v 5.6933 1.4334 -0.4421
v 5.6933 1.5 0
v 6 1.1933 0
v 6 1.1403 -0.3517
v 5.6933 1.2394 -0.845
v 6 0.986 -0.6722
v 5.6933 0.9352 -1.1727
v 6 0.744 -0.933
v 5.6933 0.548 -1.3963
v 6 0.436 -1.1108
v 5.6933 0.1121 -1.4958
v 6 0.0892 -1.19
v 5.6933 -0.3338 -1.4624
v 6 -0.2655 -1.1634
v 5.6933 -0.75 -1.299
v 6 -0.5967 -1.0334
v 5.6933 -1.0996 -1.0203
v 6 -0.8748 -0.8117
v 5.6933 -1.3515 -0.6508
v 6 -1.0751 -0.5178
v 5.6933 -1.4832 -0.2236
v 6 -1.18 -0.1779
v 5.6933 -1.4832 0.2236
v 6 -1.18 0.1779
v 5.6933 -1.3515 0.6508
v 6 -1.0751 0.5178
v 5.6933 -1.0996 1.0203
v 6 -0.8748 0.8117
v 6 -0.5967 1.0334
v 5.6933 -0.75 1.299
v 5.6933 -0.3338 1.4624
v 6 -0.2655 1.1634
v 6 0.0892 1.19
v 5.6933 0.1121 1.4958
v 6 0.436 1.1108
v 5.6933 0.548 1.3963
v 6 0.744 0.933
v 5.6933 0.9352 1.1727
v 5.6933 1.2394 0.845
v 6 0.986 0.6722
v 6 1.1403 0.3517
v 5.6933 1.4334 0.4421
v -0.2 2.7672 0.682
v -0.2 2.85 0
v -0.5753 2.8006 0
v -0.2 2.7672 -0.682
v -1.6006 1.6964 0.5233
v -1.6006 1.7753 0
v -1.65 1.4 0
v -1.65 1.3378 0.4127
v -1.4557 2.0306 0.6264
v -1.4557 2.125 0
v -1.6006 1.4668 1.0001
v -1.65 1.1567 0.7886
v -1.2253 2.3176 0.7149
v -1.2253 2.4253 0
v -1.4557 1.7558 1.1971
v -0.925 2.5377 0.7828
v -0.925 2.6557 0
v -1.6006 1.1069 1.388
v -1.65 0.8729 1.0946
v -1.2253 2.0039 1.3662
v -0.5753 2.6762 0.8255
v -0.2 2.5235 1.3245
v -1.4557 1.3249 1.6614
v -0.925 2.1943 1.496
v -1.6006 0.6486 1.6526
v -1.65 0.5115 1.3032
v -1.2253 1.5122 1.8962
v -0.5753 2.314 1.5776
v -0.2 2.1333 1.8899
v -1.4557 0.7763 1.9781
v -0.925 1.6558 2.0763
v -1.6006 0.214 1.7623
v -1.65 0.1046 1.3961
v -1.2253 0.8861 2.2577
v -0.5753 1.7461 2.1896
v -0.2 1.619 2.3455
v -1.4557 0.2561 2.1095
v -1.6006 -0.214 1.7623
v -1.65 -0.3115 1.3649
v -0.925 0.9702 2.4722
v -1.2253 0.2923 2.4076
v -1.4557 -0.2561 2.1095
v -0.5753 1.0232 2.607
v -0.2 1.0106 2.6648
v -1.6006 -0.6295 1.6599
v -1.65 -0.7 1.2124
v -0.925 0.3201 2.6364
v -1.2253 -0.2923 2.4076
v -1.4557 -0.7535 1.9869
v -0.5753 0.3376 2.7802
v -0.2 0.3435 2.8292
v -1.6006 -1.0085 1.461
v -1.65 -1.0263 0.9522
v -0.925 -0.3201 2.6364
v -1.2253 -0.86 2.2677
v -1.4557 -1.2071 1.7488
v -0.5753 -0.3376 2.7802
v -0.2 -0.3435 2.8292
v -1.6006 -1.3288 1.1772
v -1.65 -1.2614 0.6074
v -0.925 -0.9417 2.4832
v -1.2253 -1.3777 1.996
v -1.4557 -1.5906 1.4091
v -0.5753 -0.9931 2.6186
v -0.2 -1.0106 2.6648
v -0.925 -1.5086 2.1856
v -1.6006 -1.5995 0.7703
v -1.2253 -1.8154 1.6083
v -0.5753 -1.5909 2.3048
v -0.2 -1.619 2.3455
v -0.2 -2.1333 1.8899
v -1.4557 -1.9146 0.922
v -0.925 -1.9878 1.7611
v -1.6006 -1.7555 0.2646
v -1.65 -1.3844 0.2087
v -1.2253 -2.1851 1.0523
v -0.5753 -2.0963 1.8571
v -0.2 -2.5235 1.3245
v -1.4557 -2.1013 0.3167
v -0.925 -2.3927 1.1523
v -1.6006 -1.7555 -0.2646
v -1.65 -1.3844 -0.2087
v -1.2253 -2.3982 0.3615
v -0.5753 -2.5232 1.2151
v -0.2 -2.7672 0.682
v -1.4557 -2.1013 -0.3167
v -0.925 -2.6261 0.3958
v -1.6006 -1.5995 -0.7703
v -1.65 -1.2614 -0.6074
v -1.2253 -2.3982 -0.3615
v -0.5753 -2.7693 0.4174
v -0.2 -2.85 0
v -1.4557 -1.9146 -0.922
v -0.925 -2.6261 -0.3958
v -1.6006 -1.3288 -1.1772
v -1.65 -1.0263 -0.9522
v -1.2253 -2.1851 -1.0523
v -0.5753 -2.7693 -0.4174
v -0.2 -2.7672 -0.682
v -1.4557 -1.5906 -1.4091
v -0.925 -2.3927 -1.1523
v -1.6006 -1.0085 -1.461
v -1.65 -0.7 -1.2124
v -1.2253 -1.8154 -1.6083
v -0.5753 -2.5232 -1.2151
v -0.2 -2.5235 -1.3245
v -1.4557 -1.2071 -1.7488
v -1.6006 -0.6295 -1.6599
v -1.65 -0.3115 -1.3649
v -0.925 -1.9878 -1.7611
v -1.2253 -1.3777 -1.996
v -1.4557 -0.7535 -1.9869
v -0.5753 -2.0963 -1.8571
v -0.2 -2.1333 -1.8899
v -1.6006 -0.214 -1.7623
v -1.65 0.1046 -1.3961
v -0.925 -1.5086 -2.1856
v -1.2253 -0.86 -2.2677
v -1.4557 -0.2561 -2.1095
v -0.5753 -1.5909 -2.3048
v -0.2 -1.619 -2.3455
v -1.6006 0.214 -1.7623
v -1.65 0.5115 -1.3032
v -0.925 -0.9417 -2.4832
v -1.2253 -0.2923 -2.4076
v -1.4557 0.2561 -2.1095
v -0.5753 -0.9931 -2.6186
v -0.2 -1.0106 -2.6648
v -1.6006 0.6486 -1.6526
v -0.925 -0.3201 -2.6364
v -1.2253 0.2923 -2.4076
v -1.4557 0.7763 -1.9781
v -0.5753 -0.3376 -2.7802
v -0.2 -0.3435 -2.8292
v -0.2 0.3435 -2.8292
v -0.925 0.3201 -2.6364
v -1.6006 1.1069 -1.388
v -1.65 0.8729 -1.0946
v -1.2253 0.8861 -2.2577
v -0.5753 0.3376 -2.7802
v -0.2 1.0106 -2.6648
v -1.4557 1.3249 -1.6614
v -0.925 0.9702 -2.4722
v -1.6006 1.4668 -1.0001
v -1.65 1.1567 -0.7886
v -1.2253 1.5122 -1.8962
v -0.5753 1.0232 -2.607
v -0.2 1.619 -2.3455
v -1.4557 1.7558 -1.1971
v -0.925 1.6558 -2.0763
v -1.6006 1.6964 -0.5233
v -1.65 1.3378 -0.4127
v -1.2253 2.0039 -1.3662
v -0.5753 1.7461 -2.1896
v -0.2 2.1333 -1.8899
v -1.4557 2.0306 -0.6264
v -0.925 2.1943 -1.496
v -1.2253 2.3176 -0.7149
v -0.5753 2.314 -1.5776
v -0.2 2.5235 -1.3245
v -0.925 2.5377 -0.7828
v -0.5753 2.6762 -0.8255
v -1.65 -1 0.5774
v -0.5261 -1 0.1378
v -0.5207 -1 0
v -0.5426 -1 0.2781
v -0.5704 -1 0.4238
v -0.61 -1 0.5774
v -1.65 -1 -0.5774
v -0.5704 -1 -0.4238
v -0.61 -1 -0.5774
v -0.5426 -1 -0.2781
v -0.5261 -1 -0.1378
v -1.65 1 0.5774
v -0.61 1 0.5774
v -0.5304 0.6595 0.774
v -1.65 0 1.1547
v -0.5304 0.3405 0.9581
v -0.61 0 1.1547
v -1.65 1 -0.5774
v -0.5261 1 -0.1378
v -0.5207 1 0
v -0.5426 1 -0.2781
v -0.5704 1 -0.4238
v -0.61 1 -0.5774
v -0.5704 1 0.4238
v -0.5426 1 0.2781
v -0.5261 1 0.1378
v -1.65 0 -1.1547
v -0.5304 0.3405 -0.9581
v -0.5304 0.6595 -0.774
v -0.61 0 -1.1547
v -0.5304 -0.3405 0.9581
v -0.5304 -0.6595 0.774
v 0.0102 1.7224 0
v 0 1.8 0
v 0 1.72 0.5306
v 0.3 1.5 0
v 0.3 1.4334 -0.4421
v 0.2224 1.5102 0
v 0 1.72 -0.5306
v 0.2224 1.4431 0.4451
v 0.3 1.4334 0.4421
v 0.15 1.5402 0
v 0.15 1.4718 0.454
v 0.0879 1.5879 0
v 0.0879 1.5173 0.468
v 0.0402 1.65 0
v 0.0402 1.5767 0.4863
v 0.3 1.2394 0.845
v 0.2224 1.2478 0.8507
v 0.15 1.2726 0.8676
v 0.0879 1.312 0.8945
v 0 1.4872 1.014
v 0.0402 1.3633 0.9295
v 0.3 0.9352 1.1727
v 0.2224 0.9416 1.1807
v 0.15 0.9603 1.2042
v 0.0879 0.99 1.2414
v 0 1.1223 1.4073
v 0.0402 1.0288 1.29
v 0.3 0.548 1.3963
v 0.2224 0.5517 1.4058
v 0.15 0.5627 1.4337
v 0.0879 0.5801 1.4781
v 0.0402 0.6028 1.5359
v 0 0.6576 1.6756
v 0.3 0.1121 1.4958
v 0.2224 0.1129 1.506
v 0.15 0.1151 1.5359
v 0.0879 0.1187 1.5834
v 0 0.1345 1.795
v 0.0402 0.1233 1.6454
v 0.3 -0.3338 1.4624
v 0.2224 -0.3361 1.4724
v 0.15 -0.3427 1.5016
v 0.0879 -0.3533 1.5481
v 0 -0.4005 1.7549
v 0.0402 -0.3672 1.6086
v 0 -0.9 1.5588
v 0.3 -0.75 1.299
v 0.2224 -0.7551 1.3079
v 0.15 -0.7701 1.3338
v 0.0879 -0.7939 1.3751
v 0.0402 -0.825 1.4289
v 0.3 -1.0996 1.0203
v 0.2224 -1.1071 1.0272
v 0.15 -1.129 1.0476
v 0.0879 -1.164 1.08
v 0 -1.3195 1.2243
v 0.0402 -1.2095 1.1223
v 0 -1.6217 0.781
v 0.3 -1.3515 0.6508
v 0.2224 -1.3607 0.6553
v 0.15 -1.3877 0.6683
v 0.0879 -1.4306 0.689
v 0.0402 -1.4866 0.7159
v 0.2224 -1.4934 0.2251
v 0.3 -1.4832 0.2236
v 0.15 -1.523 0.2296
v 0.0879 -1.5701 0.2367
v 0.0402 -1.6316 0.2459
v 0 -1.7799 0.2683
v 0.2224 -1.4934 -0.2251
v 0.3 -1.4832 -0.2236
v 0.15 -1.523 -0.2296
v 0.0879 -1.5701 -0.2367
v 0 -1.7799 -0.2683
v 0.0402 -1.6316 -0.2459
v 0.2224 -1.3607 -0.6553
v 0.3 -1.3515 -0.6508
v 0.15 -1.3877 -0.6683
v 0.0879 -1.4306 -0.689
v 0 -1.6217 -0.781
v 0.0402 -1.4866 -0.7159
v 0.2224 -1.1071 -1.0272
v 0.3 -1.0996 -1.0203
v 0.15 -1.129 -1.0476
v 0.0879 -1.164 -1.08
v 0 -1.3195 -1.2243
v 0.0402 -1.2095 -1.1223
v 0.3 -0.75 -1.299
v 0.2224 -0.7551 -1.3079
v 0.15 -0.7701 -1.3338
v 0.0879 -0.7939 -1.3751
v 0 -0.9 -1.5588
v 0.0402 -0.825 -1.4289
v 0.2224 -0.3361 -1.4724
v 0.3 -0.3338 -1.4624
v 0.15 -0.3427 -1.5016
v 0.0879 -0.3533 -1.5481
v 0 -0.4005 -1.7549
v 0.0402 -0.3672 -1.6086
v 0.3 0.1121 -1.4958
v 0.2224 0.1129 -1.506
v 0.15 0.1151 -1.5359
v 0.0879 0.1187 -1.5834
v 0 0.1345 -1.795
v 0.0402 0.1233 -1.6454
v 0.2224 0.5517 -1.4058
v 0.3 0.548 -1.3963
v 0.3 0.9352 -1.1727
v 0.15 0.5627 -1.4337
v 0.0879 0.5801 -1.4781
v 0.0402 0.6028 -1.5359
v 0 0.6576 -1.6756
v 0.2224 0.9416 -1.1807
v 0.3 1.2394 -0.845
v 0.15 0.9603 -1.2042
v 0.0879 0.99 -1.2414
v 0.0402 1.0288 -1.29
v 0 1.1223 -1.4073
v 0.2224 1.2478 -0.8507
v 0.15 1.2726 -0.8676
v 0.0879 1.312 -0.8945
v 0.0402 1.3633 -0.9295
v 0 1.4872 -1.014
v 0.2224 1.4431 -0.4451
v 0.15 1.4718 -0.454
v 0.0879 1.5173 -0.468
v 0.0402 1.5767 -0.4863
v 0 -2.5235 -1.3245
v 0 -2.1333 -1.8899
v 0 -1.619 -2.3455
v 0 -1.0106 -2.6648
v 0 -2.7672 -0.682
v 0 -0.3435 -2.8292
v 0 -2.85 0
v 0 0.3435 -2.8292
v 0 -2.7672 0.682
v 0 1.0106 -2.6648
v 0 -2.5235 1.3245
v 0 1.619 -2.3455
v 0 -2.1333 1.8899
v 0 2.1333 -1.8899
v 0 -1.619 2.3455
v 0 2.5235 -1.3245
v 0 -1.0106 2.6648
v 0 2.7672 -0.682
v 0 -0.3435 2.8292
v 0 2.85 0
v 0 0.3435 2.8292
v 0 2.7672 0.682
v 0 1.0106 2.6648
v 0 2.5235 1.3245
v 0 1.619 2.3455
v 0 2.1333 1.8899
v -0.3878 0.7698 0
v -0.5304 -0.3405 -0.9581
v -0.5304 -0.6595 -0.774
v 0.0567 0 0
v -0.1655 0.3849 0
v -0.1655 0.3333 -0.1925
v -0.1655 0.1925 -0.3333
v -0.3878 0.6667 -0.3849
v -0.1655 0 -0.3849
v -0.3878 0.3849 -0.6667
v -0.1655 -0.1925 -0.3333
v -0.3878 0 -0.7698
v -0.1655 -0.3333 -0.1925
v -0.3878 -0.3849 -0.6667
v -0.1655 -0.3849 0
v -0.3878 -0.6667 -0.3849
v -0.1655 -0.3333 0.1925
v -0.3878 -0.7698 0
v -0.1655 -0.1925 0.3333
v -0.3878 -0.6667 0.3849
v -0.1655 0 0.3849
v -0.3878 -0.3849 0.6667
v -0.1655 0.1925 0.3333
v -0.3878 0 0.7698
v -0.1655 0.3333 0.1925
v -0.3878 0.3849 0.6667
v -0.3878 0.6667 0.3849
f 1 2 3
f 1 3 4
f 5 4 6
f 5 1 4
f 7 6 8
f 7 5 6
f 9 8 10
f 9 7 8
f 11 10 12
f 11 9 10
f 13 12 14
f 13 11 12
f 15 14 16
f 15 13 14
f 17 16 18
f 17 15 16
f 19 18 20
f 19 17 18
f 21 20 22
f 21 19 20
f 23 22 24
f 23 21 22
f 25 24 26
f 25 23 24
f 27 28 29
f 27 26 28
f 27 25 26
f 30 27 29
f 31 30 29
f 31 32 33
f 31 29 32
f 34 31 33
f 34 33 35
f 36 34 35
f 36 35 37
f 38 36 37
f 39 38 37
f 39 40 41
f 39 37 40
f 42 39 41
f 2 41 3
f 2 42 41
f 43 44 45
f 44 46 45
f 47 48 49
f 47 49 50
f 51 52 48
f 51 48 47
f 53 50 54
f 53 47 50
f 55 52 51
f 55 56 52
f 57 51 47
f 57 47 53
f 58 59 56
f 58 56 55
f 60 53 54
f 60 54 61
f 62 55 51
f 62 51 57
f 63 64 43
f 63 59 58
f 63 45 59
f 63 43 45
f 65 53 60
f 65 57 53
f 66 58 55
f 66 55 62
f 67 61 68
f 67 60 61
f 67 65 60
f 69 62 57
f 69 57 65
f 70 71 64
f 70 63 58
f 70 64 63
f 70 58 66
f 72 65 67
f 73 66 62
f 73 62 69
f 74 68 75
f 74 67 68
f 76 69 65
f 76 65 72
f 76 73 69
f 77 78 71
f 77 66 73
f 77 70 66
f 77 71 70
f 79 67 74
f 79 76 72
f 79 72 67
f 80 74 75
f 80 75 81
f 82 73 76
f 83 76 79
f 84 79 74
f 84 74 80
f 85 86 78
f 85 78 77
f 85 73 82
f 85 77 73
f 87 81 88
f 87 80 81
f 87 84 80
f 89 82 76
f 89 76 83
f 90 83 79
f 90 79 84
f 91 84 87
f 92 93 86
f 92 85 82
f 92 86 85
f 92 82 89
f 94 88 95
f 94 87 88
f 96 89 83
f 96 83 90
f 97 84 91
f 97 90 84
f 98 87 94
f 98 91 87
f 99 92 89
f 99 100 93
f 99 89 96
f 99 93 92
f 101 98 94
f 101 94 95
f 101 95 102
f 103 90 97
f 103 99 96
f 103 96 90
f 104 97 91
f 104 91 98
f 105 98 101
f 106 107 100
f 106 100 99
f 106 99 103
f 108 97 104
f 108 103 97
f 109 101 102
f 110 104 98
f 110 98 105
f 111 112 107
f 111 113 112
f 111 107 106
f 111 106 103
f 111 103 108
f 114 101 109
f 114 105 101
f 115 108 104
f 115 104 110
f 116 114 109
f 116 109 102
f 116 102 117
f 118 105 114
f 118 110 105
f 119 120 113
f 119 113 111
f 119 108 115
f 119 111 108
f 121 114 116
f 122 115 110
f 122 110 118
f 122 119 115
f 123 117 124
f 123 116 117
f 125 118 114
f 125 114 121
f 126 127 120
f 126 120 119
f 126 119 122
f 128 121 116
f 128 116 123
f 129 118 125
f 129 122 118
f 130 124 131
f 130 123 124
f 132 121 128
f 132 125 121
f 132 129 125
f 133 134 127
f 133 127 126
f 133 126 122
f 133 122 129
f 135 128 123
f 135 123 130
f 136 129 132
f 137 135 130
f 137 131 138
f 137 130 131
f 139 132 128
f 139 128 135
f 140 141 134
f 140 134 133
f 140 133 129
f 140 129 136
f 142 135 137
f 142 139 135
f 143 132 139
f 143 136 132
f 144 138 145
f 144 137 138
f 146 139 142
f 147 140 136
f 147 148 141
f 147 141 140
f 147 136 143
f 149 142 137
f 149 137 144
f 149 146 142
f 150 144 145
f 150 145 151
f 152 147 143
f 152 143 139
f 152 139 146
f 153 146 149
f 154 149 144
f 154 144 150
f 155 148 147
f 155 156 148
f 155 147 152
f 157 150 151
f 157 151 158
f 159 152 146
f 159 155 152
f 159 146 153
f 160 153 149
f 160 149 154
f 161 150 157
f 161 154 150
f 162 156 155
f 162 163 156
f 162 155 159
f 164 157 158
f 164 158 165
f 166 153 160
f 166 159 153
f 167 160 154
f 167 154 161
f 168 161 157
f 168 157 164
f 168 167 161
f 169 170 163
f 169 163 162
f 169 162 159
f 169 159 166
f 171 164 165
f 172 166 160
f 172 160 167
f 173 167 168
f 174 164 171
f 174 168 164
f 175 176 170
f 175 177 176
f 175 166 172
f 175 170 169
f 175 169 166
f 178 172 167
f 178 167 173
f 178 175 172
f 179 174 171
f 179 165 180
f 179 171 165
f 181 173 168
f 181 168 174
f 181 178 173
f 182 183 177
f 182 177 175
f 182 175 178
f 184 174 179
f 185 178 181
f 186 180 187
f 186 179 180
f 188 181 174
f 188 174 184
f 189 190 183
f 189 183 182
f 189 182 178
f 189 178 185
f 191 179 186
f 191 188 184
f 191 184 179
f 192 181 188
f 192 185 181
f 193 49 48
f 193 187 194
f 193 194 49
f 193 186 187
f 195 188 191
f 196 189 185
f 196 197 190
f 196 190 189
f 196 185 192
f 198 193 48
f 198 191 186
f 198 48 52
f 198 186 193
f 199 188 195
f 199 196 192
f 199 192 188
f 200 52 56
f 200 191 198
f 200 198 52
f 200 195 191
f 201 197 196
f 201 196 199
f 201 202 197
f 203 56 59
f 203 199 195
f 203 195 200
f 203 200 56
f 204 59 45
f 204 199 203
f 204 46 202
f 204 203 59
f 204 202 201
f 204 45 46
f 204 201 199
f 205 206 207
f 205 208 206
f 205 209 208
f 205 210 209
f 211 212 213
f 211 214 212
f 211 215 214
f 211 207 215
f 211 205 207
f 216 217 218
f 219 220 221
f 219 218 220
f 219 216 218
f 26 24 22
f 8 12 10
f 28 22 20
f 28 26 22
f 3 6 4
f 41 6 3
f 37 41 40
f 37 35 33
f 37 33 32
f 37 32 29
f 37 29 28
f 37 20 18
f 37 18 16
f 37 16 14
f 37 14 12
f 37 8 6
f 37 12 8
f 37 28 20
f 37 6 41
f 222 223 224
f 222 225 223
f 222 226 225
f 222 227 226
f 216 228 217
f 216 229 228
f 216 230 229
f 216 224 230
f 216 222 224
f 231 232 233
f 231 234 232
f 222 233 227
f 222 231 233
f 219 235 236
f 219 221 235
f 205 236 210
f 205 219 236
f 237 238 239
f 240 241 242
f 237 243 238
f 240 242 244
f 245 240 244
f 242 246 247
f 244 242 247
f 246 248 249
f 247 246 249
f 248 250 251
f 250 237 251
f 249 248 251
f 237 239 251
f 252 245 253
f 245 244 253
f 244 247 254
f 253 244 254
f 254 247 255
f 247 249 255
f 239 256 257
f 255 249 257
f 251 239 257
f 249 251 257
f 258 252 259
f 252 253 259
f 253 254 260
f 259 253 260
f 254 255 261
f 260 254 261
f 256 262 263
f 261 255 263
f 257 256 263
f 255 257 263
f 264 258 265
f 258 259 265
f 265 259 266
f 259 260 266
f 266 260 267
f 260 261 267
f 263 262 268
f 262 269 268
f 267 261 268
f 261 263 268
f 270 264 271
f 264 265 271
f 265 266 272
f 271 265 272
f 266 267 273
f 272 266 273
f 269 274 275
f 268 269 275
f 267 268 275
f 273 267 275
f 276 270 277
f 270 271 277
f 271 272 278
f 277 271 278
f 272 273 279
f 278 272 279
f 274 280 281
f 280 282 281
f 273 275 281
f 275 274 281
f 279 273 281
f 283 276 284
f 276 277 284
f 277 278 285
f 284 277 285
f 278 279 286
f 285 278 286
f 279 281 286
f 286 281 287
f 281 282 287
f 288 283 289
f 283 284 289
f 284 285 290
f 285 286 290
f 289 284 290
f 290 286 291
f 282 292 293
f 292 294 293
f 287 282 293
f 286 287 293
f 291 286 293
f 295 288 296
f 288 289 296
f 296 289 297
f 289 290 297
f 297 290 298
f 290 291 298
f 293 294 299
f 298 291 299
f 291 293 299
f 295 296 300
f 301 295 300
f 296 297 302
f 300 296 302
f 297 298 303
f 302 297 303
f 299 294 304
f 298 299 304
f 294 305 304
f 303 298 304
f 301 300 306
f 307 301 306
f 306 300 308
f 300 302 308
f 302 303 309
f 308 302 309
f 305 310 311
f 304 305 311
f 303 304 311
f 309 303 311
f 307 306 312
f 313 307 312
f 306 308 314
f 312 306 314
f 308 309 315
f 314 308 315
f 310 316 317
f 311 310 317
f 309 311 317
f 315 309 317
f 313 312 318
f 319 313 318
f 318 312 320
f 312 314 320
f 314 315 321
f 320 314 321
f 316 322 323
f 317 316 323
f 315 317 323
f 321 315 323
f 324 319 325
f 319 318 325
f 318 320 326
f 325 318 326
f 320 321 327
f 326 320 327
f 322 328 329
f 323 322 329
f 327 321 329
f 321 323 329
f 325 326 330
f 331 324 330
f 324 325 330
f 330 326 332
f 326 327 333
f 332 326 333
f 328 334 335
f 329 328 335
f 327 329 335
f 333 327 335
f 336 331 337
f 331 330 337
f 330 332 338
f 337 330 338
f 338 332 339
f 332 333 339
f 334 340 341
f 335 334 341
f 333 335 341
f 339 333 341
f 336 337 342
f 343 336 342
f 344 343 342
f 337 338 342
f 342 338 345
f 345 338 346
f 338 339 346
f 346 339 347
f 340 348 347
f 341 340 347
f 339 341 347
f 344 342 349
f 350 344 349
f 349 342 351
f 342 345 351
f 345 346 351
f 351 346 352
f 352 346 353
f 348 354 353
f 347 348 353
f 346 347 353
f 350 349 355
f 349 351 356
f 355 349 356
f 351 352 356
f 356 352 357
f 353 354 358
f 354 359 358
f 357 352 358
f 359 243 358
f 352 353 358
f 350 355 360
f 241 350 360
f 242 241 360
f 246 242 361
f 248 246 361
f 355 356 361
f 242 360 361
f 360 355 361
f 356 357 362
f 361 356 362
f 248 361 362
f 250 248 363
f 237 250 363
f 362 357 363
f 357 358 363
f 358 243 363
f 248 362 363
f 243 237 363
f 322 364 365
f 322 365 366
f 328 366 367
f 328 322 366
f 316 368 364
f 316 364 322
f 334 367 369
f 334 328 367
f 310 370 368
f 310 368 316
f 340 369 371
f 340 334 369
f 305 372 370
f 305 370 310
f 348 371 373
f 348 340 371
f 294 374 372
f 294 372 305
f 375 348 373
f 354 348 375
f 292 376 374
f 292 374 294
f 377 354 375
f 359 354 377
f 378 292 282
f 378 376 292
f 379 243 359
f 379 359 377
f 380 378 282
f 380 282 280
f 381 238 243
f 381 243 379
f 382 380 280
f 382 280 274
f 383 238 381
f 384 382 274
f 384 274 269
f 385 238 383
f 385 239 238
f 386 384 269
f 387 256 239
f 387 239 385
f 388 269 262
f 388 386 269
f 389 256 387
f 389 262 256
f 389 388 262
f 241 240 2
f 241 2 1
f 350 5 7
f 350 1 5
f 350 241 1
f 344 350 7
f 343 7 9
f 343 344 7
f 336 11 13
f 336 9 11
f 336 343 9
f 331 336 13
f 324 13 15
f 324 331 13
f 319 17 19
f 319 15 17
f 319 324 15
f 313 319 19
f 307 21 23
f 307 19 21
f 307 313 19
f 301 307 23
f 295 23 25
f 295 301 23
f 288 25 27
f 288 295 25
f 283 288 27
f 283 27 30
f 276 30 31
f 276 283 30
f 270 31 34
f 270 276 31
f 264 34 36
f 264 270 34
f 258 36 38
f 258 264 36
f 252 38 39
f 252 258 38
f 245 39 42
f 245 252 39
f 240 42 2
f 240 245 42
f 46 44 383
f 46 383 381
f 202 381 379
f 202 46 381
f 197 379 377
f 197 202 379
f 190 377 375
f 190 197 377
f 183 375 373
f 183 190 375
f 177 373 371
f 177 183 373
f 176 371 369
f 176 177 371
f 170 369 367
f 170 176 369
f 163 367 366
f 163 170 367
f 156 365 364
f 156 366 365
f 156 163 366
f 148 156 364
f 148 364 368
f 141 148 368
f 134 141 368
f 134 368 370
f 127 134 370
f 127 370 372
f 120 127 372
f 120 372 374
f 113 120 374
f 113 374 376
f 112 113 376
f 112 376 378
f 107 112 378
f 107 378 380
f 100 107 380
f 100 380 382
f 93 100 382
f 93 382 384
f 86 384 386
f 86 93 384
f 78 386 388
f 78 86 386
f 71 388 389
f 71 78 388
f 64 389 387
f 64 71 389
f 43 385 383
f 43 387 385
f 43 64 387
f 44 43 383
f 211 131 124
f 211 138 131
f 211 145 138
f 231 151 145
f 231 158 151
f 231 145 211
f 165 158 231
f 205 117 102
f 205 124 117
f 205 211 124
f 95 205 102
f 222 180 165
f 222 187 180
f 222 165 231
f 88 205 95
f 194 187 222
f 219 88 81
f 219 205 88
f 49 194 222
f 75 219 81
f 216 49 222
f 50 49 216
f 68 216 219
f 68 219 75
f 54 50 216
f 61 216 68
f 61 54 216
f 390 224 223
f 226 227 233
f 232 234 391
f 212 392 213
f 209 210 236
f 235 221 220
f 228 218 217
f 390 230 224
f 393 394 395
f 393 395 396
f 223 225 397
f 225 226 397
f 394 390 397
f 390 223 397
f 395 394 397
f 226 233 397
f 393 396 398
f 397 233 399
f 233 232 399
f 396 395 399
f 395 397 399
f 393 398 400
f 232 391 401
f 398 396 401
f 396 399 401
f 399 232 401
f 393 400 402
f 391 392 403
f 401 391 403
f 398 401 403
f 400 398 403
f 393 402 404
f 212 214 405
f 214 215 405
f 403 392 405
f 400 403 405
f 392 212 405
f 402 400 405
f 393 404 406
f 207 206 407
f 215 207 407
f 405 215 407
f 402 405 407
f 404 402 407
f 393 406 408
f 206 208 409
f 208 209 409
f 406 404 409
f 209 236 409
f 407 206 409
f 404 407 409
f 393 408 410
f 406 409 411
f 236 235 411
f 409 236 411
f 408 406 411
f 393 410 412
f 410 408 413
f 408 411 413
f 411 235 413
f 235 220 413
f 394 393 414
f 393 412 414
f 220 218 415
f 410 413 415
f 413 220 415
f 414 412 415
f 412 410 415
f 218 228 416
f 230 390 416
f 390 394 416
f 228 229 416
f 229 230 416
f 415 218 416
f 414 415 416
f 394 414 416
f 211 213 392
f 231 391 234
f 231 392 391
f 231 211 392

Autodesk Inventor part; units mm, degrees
ref_plane "YZ Plane" through (0, 0, 0) normal (1, 0, 0) x (0, 1, 0)
ref_plane "XZ Plane" through (0, 0, 0) normal (0, 1, 0) x (-1, 0, 0)
sketch "Sketch1" plane through (0, 0, 0) normal (0, 0, 1) x (1, 0, 0)
  line L0 (0.0567, 0) -> (6, 0)
  line L1 (6, 0) -> (6, 1.5)
  line L2 (6, 1.5) -> (1.5, 1.5)
  line L3 (1.5, 1.5) -> (1.1932, 1.5)
  line L4 (1.1932, 1.5) -> (0, 1.5)
  line L5 (0, 1.5) -> (0, 2.85)
  line L6 (0, 2.85) -> (-1.65, 2.85)
  line L7 (-1.65, 2.85) -> (-1.65, 1.1547)
  line L8 (-1.65, 1.1547) -> (-0.61, 1.1547)
  line L9 (-0.61, 1.1547) -> (0.0567, 0)
  line L10 (-3.18, 0) -> (7.53, 0) projected
  line L11 (0, -0.57) -> (0, 3.42) projected
  line L12 (1.5, 1.5) -> (0, 1.5) construction
  dimension "d1" = 4.5
  dimension "d2" = 0.3068
  dimension "d3" = 1.65
  dimension "d4" = 1.04
  dimension "d5" = 60
  dimension "d6" = 3
  dimension "d7" = 3
  dimension "d8" = 2.3094
  dimension "d9" = 5.7
  dimension "d26" = 6
revolve "Body" add sketch "Sketch1" angle 360 about axis through (0.0567, 0, 0) along (1, 0, 0) contours L9 L11 L4 L3 L2 L1 L0 | L9 L8 L7 L6 L5 L11
sketch "Sketch2" plane through (-1.65, 0, 0) normal (-1, 0, 0) x (0, 0, 1)
  circle A0 centre (0, 0) radius 1.1547 projected
  line L0 (0, -3.99) -> (0, 3.99) projected
  line L1 (-3.99, 0) -> (3.99, 0) projected
  line L2 (1.1547, 0) -> (0.5774, -1)
  line L3 (0.5774, -1) -> (-0.5774, -1)
  line L4 (-0.5774, -1) -> (-1.1547, 0)
  line L5 (-1.1547, 0) -> (-0.5774, 1)
  line L6 (-0.5774, 1) -> (0.5774, 1)
  line L7 (0.5774, 1) -> (1.1547, 0)
extrude "Slot" add sketch "Sketch2" against normal up to next contours L7 A0 | A0 L2 | L6 L0 A0 | A0 L0 L3 | L0 L6 A0 | A0 L3 L0 | L4 A0 | A0 L5
fillet "Fillet1" radius 1.45 1 edges at (-1.65, -2.85, 0)
thread "Thread" size "M3x0.5" class "6g" standard "ISO Metric profile" length 4.5
chamfer "Chamfer1" distance 0.3067 distance2 0.3067 1 edges at (6, -1.5, 0) measured on face at (6, -0.2617, -0.7882)
ref_plane "Work Plane1" through (29, 0, 0) normal (0, -1, 0) x (1, 0, 0)
fillet "Fillet2" radius 0.3 1 edges at (0, -1.5, 0)
equation "\"d1\" = GEL"
equation "\"d3\" = KOH"
equation "\"d4\" = INTI"
equation "\"d6\" = GD"
equation "\"d7\" = BDM"
equation "\"d8\" = 1.1547 * SW"
equation "\"d9\" = KOD"
equation "\"d26\" = NLG"
equation "\"d30\" = R"
equation "\"d17\" = RR"
equation "\"d13\" = GEL"
equation "\"d15\" = -0.5 * SPD + 0.5 * GD"
equation "\"d16\" = GUL"
equation "\"GD\" = NND"
equation "\"NLG\" = 6"
equation "\"GEL\" = 4.5"
equation "\"KOD\" = 5.7"
equation "\"KOH\" = 1.65"
equation "\"INTI\" = 1.04"
equation "\"GAL\" = 0.61345 * PTC"
equation "\"GUL\" = 0.61345 * PTC"
equation "\"BDM\" = NND"
equation "\"SW\" = 2"
equation "\"RR\" = 1.45"
equation "\"SPD\" = NND - 1.2269 * PTC"
equation "\"R\" = 0.3"
equation "\"TOA\" = 30deg"
equation "\"GD1\" = THREADDIA - 1.2269 * PTC"
equation "\"THREADDIA\" = 3"
equation "\"PTC\" = 0.5"
equation "\"NND\" = 3"
equation "\"KOH1\" = 0.2"
equation "\"E0\" = 2.303"
properties part number "ISO 7380-1 - M3 x 6" material "Steel"
